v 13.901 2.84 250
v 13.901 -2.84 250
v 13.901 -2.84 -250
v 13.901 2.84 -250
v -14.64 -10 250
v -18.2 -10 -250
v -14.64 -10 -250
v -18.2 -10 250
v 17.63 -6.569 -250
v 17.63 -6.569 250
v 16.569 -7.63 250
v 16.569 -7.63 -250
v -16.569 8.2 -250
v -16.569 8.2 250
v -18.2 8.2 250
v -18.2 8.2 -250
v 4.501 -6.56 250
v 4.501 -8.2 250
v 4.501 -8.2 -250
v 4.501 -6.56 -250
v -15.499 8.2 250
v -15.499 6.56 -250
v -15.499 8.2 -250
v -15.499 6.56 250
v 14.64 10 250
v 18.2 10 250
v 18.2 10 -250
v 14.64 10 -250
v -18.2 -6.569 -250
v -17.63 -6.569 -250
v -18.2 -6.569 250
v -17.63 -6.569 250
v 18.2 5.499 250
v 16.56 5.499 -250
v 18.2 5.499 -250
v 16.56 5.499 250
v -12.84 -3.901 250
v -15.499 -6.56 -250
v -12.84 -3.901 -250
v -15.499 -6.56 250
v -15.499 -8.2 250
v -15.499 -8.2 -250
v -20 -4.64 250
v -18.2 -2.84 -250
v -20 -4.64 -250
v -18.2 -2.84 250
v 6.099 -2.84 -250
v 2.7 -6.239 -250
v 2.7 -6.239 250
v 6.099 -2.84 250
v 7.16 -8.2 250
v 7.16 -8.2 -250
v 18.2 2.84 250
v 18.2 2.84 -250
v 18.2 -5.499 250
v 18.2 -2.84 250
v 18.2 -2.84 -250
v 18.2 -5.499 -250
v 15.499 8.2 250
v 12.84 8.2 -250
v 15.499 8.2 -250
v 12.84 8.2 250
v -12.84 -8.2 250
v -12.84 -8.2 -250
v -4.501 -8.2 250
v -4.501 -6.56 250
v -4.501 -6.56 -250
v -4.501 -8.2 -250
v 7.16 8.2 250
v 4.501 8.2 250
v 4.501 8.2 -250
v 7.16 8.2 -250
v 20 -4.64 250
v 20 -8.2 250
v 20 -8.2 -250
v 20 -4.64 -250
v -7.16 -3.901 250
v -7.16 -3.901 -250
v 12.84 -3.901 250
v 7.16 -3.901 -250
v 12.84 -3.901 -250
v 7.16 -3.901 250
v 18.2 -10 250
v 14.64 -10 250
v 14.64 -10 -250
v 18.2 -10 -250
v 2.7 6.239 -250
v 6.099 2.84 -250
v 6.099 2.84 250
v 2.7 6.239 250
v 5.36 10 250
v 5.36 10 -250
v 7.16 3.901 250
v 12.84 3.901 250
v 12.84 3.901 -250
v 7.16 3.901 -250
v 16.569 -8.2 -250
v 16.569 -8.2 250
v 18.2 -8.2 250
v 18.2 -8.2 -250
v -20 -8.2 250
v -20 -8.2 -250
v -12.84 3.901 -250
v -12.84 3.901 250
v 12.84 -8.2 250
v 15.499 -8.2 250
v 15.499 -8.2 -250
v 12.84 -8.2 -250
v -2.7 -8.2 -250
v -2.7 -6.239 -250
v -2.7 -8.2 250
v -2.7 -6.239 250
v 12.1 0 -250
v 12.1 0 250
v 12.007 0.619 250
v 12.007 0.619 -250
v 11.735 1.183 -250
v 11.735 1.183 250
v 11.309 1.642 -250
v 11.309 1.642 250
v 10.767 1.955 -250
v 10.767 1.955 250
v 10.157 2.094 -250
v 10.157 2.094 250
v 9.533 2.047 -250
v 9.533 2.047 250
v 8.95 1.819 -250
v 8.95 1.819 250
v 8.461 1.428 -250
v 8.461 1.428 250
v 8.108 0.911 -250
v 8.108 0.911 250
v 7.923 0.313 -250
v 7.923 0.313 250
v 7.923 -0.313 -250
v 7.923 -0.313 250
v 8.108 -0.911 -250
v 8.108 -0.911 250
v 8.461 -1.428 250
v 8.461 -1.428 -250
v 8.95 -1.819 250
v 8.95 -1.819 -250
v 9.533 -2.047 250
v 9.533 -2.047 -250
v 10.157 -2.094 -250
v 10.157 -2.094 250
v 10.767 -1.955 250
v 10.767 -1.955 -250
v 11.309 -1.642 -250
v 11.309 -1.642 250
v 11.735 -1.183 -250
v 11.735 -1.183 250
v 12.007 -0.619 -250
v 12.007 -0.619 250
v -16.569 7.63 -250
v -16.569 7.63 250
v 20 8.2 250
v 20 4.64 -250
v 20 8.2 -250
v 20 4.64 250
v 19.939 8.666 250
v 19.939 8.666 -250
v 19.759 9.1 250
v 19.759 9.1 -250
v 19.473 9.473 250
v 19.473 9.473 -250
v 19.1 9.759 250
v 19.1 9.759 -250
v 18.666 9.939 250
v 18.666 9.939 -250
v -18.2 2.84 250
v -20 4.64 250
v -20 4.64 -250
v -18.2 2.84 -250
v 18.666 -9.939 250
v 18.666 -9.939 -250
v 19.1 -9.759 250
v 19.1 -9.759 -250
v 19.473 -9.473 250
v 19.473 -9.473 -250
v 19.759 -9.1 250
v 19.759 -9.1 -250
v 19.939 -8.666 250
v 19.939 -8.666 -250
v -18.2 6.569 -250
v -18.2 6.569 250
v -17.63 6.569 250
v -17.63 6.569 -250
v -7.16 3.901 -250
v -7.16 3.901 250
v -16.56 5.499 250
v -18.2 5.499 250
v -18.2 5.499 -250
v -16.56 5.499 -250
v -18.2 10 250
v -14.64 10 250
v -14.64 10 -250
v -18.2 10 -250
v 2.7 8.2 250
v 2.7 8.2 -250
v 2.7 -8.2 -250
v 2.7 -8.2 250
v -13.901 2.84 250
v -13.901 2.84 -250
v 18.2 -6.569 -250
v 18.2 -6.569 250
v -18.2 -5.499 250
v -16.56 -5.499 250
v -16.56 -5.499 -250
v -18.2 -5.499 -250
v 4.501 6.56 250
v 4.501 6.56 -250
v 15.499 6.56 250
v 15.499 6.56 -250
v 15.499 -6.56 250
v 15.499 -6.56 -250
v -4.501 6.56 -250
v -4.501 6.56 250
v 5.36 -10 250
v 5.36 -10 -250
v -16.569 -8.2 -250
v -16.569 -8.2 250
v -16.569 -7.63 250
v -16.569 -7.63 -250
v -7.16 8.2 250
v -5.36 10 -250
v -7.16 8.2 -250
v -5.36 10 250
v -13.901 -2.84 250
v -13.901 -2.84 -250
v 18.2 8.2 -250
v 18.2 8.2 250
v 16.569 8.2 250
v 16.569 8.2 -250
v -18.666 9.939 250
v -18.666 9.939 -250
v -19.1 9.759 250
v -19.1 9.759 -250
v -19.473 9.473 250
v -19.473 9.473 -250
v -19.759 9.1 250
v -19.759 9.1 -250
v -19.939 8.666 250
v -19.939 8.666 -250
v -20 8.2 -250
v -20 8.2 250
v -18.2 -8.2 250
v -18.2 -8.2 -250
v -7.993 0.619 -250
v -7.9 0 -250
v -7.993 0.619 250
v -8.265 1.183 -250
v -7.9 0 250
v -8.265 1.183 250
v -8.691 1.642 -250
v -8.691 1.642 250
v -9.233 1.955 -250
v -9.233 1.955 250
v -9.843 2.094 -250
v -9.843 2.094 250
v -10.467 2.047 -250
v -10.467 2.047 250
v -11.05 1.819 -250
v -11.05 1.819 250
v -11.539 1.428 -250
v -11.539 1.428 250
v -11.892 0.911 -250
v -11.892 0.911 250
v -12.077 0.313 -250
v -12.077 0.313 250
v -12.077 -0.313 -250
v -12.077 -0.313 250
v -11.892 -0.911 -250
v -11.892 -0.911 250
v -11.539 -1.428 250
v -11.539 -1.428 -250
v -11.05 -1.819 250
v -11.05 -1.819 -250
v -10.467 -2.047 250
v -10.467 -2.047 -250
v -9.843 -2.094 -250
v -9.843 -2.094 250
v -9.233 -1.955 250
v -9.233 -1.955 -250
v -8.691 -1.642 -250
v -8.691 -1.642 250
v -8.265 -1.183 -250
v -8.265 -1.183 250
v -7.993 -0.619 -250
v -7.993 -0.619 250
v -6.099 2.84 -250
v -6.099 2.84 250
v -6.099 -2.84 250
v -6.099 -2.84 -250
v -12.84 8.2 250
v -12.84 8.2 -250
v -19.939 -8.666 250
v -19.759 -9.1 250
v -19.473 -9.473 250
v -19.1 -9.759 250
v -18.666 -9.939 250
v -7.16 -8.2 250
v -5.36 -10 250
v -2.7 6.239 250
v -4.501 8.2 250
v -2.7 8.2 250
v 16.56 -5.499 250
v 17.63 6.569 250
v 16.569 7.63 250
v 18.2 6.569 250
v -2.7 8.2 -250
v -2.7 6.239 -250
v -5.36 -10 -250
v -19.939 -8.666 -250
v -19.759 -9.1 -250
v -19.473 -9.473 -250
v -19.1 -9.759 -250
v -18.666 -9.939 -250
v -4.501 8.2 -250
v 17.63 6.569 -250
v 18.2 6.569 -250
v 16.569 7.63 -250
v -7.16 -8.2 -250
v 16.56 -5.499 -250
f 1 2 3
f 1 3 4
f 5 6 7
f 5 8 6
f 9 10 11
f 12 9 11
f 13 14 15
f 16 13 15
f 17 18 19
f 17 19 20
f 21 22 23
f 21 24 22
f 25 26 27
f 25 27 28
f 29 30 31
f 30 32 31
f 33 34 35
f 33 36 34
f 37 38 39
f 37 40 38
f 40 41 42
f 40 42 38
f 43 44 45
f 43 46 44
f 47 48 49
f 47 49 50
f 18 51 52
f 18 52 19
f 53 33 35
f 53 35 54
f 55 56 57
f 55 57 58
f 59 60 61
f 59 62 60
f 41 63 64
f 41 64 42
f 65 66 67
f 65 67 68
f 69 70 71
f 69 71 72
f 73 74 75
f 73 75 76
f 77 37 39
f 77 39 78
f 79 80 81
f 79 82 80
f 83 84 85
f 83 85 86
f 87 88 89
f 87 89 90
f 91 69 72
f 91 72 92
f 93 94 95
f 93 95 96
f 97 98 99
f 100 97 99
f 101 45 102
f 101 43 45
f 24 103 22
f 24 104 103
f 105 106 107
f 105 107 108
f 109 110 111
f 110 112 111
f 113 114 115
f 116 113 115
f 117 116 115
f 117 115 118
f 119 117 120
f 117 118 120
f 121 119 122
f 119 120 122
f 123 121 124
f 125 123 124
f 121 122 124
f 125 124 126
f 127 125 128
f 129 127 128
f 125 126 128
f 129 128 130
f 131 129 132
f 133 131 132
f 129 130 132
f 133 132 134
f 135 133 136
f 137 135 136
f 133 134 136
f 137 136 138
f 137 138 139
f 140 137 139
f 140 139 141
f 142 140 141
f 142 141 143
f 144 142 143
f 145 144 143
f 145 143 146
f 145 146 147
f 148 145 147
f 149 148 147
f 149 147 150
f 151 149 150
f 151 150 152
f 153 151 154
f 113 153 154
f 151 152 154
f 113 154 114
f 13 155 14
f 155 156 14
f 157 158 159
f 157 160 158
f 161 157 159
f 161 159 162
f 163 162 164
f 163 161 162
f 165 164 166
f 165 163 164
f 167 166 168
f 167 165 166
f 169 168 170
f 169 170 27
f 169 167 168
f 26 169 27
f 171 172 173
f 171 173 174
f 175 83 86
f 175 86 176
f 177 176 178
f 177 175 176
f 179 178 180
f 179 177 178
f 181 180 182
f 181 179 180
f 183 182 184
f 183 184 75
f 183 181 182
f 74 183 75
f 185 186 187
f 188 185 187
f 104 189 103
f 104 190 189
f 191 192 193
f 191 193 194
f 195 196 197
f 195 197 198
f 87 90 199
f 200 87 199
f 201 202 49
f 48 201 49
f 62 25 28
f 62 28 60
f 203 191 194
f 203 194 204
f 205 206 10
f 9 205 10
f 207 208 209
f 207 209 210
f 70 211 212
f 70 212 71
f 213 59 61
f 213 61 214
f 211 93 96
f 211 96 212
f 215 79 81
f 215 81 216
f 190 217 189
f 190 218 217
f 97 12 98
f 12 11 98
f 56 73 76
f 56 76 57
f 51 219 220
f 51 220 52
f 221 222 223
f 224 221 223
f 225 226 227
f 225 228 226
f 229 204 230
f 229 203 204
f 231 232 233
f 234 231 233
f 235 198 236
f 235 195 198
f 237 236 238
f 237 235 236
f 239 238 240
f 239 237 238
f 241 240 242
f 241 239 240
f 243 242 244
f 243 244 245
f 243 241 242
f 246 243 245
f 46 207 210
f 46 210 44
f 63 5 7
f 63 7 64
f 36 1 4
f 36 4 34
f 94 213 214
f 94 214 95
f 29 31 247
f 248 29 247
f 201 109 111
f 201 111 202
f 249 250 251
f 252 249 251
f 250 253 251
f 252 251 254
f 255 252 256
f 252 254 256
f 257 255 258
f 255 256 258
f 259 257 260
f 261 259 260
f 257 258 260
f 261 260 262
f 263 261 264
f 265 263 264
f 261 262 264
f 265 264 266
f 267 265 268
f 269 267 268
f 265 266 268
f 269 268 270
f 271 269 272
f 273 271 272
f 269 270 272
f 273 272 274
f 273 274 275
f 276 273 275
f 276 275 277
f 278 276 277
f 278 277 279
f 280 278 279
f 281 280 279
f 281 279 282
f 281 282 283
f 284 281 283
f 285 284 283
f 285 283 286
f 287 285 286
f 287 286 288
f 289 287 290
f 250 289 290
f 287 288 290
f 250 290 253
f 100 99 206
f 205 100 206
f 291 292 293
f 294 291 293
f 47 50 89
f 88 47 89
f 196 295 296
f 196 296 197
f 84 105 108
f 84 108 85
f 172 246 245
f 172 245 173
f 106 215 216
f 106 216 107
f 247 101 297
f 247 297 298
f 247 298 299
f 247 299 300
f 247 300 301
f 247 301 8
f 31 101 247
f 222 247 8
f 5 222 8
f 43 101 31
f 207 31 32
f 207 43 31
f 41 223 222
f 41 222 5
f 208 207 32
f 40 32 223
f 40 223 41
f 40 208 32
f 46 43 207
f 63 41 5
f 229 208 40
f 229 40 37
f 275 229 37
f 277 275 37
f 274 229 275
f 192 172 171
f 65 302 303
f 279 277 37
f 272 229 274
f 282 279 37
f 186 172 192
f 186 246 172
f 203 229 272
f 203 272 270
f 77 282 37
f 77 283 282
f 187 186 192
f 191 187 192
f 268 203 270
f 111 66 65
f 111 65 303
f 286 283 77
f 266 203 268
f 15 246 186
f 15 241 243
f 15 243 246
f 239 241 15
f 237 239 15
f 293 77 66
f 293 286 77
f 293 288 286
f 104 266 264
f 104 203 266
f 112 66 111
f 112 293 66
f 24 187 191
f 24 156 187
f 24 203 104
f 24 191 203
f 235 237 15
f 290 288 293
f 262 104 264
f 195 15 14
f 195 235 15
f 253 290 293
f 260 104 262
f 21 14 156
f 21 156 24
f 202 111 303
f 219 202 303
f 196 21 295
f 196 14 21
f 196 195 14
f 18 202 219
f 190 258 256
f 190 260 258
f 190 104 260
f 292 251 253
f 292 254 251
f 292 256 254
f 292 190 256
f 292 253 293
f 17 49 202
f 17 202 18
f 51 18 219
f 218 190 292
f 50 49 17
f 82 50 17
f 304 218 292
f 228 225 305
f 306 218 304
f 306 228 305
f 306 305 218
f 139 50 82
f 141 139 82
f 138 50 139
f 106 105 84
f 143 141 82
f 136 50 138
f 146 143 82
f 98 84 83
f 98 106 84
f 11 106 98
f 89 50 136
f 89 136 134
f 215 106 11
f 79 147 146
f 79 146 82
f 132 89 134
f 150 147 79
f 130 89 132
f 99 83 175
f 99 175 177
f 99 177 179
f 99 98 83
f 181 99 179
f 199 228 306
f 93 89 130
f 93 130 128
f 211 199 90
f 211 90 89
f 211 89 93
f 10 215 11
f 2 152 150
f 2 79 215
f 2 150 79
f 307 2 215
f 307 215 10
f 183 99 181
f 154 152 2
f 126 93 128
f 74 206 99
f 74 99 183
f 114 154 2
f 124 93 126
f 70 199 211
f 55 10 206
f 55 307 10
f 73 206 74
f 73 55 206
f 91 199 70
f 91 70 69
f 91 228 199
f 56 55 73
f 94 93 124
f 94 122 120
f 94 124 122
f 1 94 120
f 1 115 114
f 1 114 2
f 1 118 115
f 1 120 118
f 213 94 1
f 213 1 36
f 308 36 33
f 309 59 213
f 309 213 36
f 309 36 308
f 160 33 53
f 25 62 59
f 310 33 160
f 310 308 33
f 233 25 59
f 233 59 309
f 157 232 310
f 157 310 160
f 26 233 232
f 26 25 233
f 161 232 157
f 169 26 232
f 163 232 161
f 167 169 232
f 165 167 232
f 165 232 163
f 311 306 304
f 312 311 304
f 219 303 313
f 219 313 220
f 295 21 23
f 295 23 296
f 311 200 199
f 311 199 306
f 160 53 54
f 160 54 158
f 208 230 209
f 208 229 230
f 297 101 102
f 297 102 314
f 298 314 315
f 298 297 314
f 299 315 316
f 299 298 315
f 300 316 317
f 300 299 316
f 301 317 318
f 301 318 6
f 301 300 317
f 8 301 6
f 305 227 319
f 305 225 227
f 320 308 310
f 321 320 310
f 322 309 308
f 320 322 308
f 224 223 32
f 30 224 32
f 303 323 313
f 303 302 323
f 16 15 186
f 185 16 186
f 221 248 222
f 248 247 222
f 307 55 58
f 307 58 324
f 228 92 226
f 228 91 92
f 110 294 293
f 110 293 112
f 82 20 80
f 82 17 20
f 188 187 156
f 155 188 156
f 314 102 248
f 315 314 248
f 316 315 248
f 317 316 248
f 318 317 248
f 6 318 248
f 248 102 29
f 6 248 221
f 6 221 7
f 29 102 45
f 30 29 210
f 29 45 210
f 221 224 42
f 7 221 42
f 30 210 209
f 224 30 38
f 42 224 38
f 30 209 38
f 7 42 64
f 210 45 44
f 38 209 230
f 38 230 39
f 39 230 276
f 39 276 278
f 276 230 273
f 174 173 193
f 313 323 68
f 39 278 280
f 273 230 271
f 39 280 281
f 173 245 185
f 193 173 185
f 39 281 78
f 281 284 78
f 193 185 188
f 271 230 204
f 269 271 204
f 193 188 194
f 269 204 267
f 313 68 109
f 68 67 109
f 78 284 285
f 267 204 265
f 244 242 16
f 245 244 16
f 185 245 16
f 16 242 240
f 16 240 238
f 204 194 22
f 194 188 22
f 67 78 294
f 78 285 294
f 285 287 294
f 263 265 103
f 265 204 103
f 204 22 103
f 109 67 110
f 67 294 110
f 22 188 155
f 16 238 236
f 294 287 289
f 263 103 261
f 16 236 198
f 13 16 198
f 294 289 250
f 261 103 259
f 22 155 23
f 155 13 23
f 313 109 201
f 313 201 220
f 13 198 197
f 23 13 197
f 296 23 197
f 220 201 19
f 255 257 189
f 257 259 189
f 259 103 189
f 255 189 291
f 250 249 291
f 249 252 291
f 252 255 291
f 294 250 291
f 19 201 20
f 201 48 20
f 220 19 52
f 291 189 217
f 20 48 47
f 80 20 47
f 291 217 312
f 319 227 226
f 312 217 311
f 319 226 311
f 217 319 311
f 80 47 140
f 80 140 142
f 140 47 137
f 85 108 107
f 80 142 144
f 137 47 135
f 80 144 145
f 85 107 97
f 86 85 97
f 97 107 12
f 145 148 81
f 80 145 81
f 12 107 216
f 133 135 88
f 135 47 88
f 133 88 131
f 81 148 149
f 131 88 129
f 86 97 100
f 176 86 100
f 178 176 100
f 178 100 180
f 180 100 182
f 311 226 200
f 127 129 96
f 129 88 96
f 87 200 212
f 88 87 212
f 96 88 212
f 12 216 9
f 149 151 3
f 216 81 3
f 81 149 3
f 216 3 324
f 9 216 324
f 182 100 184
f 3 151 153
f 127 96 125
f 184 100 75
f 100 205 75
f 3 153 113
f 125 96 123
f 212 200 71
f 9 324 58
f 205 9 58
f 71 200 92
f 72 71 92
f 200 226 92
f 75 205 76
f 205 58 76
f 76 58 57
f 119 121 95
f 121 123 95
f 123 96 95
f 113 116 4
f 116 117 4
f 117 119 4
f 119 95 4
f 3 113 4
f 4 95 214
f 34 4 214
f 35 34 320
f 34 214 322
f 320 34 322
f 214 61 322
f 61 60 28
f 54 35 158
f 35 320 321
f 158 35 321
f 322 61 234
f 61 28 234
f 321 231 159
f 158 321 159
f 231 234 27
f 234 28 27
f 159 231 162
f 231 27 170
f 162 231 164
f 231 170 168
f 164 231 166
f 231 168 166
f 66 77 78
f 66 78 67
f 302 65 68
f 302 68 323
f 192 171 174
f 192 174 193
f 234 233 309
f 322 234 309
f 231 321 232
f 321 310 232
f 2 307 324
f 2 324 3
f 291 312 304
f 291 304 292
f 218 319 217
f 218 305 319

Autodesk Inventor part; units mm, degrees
ref_plane "YZ Plane" through (0, 0, 0) normal (1, 0, 0) x (0, 1, 0)
ref_plane "XZ Plane" through (0, 0, 0) normal (0, 1, 0) x (-1, 0, 0)
ref_plane "Work Plane2" through (-5.36, -10, 250) normal (0, 0, 1) x (1, 0, 0)
sketch "Sketch1" plane through (-5.36, -10, 250) normal (0, 0, 1) x (1, 0, 0)
  line L0 (-1.8, 13.9007) -> (-7.48, 13.9007) projected
  line L1 (-7.48, 13.9007) -> (-10.1393, 16.56) projected
  line L2 (-10.1393, 16.56) -> (-10.1393, 18.2) projected
  line L3 (-10.1393, 18.2) -> (-7.48, 18.2) projected
  line L4 (-7.48, 18.2) -> (-9.28, 20) projected
  line L5 (-9.28, 20) -> (-12.84, 20) projected
  arc A0 (-12.84, 20) -> (-14.64, 18.2) centre (-12.84, 18.2) ccw projected
  line L6 (-14.64, 18.2) -> (-14.64, 14.64) projected
  line L7 (-14.64, 14.64) -> (-12.84, 12.84) projected
  line L8 (-12.84, 12.84) -> (-12.84, 15.4993) projected
  line L9 (-12.84, 15.4993) -> (-11.2, 15.4993) projected
  line L10 (-11.2, 15.4993) -> (-8.5407, 12.84) projected
  line L11 (-8.5407, 12.84) -> (-8.5407, 7.16) projected
  line L12 (-8.5407, 7.16) -> (-11.2, 4.5007) projected
  line L13 (-11.2, 4.5007) -> (-12.84, 4.5007) projected
  line L14 (-12.84, 4.5007) -> (-12.84, 7.16) projected
  line L15 (-12.84, 7.16) -> (-14.64, 5.36) projected
  line L16 (-14.64, 5.36) -> (-14.64, 1.8) projected
  arc A1 (-14.64, 1.8) -> (-12.84, 0) centre (-12.84, 1.8) ccw projected
  line L17 (-12.84, 0) -> (-9.28, 0) projected
  line L18 (-9.28, 0) -> (-7.48, 1.8) projected
  line L19 (-7.48, 1.8) -> (-10.1393, 1.8) projected
  line L20 (-10.1393, 1.8) -> (-10.1393, 3.44) projected
  line L21 (-10.1393, 3.44) -> (-7.48, 6.0993) projected
  line L22 (-7.48, 6.0993) -> (-1.8, 6.0993) projected
  line L23 (-1.8, 6.0993) -> (0.8593, 3.44) projected
  line L24 (0.8593, 3.44) -> (0.8593, 1.8) projected
  line L25 (0.8593, 1.8) -> (-1.8, 1.8) projected
  line L26 (-1.8, 1.8) -> (0, 0) projected
  line L27 (0, 0) -> (10.72, 0) projected
  line L28 (10.72, 0) -> (12.52, 1.8) projected
  line L29 (12.52, 1.8) -> (9.8607, 1.8) projected
  line L30 (9.8607, 1.8) -> (9.8607, 3.44) projected
  line L31 (9.8607, 3.44) -> (12.52, 6.0993) projected
  line L32 (12.52, 6.0993) -> (18.2, 6.0993) projected
  line L33 (18.2, 6.0993) -> (20.8593, 3.44) projected
  line L34 (20.8593, 3.44) -> (20.8593, 1.8) projected
  line L35 (20.8593, 1.8) -> (18.2, 1.8) projected
  line L36 (18.2, 1.8) -> (20, 0) projected
  line L37 (20, 0) -> (23.56, 0) projected
  arc A2 (23.56, 0) -> (25.36, 1.8) centre (23.56, 1.8) ccw projected
  line L38 (25.36, 1.8) -> (25.36, 5.36) projected
  line L39 (25.36, 5.36) -> (23.56, 7.16) projected
  line L40 (23.56, 7.16) -> (23.56, 4.5007) projected
  line L41 (23.56, 4.5007) -> (21.92, 4.5007) projected
  line L42 (21.92, 4.5007) -> (19.2607, 7.16) projected
  line L43 (19.2607, 7.16) -> (19.2607, 12.84) projected
  line L44 (19.2607, 12.84) -> (21.92, 15.4993) projected
  line L45 (21.92, 15.4993) -> (23.56, 15.4993) projected
  line L46 (23.56, 15.4993) -> (23.56, 12.84) projected
  line L47 (23.56, 12.84) -> (25.36, 14.64) projected
  line L48 (25.36, 14.64) -> (25.36, 18.2) projected
  arc A3 (25.36, 18.2) -> (23.56, 20) centre (23.56, 18.2) ccw projected
  line L49 (23.56, 20) -> (20, 20) projected
  line L50 (20, 20) -> (18.2, 18.2) projected
  line L51 (18.2, 18.2) -> (20.8593, 18.2) projected
  line L52 (20.8593, 18.2) -> (20.8593, 16.56) projected
  line L53 (20.8593, 16.56) -> (18.2, 13.9007) projected
  line L54 (18.2, 13.9007) -> (12.52, 13.9007) projected
  line L55 (12.52, 13.9007) -> (9.8607, 16.56) projected
  line L56 (9.8607, 16.56) -> (9.8607, 18.2) projected
  line L57 (9.8607, 18.2) -> (12.52, 18.2) projected
  line L58 (12.52, 18.2) -> (10.72, 20) projected
  line L59 (10.72, 20) -> (0, 20) projected
  line L60 (0, 20) -> (-1.8, 18.2) projected
  line L61 (-1.8, 18.2) -> (0.8593, 18.2) projected
  line L62 (0.8593, 18.2) -> (0.8593, 16.56) projected
  line L63 (0.8593, 16.56) -> (-1.8, 13.9007) projected
  circle A4 centre (-4.64, 10) radius 2.1 projected
  line L64 (-12.84, 1.8) -> (-11.2093, 1.8) projected
  line L65 (-12.84, 3.4307) -> (-12.84, 1.8) projected
  line L66 (-12.27, 3.4307) -> (-12.84, 3.4307) projected
  line L67 (-11.2093, 2.37) -> (-12.27, 3.4307) projected
  line L68 (-11.2093, 1.8) -> (-11.2093, 2.37) projected
  line L69 (23.56, 16.5693) -> (23.56, 18.2) projected
  line L70 (22.99, 16.5693) -> (23.56, 16.5693) projected
  line L71 (21.9293, 17.63) -> (22.99, 16.5693) projected
  line L72 (21.9293, 18.2) -> (21.9293, 17.63) projected
  line L73 (23.56, 18.2) -> (21.9293, 18.2) projected
  circle A5 centre (15.36, 10) radius 2.1 projected
  line L74 (23.56, 1.8) -> (23.56, 3.4307) projected
  line L75 (21.9293, 1.8) -> (23.56, 1.8) projected
  line L76 (21.9293, 2.37) -> (21.9293, 1.8) projected
  line L77 (22.99, 3.4307) -> (21.9293, 2.37) projected
  line L78 (23.56, 3.4307) -> (22.99, 3.4307) projected
  line L79 (-11.2093, 18.2) -> (-12.84, 18.2) projected
  line L80 (-11.2093, 17.63) -> (-11.2093, 18.2) projected
  line L81 (-12.27, 16.5693) -> (-11.2093, 17.63) projected
  line L82 (-12.84, 16.5693) -> (-12.27, 16.5693) projected
  line L83 (-12.84, 18.2) -> (-12.84, 16.5693) projected
  line L84 (8.06, 18.2) -> (2.66, 18.2) projected
  line L85 (8.06, 16.2393) -> (8.06, 18.2) projected
  line L86 (11.4593, 12.84) -> (8.06, 16.2393) projected
  line L87 (11.4593, 7.16) -> (11.4593, 12.84) projected
  line L88 (8.06, 3.7607) -> (11.4593, 7.16) projected
  line L89 (8.06, 1.8) -> (8.06, 3.7607) projected
  line L90 (2.66, 1.8) -> (8.06, 1.8) projected
  line L91 (2.66, 3.7607) -> (2.66, 1.8) projected
  line L92 (-0.7393, 7.16) -> (2.66, 3.7607) projected
  line L93 (-0.7393, 12.84) -> (-0.7393, 7.16) projected
  line L94 (2.66, 16.2393) -> (-0.7393, 12.84) projected
  line L95 (2.66, 18.2) -> (2.66, 16.2393) projected
  point P0 (5.36, 10)
extrude "Extrusion2" add sketch "Sketch1" against normal blind 500
properties part number "vslot_20x40x500"
